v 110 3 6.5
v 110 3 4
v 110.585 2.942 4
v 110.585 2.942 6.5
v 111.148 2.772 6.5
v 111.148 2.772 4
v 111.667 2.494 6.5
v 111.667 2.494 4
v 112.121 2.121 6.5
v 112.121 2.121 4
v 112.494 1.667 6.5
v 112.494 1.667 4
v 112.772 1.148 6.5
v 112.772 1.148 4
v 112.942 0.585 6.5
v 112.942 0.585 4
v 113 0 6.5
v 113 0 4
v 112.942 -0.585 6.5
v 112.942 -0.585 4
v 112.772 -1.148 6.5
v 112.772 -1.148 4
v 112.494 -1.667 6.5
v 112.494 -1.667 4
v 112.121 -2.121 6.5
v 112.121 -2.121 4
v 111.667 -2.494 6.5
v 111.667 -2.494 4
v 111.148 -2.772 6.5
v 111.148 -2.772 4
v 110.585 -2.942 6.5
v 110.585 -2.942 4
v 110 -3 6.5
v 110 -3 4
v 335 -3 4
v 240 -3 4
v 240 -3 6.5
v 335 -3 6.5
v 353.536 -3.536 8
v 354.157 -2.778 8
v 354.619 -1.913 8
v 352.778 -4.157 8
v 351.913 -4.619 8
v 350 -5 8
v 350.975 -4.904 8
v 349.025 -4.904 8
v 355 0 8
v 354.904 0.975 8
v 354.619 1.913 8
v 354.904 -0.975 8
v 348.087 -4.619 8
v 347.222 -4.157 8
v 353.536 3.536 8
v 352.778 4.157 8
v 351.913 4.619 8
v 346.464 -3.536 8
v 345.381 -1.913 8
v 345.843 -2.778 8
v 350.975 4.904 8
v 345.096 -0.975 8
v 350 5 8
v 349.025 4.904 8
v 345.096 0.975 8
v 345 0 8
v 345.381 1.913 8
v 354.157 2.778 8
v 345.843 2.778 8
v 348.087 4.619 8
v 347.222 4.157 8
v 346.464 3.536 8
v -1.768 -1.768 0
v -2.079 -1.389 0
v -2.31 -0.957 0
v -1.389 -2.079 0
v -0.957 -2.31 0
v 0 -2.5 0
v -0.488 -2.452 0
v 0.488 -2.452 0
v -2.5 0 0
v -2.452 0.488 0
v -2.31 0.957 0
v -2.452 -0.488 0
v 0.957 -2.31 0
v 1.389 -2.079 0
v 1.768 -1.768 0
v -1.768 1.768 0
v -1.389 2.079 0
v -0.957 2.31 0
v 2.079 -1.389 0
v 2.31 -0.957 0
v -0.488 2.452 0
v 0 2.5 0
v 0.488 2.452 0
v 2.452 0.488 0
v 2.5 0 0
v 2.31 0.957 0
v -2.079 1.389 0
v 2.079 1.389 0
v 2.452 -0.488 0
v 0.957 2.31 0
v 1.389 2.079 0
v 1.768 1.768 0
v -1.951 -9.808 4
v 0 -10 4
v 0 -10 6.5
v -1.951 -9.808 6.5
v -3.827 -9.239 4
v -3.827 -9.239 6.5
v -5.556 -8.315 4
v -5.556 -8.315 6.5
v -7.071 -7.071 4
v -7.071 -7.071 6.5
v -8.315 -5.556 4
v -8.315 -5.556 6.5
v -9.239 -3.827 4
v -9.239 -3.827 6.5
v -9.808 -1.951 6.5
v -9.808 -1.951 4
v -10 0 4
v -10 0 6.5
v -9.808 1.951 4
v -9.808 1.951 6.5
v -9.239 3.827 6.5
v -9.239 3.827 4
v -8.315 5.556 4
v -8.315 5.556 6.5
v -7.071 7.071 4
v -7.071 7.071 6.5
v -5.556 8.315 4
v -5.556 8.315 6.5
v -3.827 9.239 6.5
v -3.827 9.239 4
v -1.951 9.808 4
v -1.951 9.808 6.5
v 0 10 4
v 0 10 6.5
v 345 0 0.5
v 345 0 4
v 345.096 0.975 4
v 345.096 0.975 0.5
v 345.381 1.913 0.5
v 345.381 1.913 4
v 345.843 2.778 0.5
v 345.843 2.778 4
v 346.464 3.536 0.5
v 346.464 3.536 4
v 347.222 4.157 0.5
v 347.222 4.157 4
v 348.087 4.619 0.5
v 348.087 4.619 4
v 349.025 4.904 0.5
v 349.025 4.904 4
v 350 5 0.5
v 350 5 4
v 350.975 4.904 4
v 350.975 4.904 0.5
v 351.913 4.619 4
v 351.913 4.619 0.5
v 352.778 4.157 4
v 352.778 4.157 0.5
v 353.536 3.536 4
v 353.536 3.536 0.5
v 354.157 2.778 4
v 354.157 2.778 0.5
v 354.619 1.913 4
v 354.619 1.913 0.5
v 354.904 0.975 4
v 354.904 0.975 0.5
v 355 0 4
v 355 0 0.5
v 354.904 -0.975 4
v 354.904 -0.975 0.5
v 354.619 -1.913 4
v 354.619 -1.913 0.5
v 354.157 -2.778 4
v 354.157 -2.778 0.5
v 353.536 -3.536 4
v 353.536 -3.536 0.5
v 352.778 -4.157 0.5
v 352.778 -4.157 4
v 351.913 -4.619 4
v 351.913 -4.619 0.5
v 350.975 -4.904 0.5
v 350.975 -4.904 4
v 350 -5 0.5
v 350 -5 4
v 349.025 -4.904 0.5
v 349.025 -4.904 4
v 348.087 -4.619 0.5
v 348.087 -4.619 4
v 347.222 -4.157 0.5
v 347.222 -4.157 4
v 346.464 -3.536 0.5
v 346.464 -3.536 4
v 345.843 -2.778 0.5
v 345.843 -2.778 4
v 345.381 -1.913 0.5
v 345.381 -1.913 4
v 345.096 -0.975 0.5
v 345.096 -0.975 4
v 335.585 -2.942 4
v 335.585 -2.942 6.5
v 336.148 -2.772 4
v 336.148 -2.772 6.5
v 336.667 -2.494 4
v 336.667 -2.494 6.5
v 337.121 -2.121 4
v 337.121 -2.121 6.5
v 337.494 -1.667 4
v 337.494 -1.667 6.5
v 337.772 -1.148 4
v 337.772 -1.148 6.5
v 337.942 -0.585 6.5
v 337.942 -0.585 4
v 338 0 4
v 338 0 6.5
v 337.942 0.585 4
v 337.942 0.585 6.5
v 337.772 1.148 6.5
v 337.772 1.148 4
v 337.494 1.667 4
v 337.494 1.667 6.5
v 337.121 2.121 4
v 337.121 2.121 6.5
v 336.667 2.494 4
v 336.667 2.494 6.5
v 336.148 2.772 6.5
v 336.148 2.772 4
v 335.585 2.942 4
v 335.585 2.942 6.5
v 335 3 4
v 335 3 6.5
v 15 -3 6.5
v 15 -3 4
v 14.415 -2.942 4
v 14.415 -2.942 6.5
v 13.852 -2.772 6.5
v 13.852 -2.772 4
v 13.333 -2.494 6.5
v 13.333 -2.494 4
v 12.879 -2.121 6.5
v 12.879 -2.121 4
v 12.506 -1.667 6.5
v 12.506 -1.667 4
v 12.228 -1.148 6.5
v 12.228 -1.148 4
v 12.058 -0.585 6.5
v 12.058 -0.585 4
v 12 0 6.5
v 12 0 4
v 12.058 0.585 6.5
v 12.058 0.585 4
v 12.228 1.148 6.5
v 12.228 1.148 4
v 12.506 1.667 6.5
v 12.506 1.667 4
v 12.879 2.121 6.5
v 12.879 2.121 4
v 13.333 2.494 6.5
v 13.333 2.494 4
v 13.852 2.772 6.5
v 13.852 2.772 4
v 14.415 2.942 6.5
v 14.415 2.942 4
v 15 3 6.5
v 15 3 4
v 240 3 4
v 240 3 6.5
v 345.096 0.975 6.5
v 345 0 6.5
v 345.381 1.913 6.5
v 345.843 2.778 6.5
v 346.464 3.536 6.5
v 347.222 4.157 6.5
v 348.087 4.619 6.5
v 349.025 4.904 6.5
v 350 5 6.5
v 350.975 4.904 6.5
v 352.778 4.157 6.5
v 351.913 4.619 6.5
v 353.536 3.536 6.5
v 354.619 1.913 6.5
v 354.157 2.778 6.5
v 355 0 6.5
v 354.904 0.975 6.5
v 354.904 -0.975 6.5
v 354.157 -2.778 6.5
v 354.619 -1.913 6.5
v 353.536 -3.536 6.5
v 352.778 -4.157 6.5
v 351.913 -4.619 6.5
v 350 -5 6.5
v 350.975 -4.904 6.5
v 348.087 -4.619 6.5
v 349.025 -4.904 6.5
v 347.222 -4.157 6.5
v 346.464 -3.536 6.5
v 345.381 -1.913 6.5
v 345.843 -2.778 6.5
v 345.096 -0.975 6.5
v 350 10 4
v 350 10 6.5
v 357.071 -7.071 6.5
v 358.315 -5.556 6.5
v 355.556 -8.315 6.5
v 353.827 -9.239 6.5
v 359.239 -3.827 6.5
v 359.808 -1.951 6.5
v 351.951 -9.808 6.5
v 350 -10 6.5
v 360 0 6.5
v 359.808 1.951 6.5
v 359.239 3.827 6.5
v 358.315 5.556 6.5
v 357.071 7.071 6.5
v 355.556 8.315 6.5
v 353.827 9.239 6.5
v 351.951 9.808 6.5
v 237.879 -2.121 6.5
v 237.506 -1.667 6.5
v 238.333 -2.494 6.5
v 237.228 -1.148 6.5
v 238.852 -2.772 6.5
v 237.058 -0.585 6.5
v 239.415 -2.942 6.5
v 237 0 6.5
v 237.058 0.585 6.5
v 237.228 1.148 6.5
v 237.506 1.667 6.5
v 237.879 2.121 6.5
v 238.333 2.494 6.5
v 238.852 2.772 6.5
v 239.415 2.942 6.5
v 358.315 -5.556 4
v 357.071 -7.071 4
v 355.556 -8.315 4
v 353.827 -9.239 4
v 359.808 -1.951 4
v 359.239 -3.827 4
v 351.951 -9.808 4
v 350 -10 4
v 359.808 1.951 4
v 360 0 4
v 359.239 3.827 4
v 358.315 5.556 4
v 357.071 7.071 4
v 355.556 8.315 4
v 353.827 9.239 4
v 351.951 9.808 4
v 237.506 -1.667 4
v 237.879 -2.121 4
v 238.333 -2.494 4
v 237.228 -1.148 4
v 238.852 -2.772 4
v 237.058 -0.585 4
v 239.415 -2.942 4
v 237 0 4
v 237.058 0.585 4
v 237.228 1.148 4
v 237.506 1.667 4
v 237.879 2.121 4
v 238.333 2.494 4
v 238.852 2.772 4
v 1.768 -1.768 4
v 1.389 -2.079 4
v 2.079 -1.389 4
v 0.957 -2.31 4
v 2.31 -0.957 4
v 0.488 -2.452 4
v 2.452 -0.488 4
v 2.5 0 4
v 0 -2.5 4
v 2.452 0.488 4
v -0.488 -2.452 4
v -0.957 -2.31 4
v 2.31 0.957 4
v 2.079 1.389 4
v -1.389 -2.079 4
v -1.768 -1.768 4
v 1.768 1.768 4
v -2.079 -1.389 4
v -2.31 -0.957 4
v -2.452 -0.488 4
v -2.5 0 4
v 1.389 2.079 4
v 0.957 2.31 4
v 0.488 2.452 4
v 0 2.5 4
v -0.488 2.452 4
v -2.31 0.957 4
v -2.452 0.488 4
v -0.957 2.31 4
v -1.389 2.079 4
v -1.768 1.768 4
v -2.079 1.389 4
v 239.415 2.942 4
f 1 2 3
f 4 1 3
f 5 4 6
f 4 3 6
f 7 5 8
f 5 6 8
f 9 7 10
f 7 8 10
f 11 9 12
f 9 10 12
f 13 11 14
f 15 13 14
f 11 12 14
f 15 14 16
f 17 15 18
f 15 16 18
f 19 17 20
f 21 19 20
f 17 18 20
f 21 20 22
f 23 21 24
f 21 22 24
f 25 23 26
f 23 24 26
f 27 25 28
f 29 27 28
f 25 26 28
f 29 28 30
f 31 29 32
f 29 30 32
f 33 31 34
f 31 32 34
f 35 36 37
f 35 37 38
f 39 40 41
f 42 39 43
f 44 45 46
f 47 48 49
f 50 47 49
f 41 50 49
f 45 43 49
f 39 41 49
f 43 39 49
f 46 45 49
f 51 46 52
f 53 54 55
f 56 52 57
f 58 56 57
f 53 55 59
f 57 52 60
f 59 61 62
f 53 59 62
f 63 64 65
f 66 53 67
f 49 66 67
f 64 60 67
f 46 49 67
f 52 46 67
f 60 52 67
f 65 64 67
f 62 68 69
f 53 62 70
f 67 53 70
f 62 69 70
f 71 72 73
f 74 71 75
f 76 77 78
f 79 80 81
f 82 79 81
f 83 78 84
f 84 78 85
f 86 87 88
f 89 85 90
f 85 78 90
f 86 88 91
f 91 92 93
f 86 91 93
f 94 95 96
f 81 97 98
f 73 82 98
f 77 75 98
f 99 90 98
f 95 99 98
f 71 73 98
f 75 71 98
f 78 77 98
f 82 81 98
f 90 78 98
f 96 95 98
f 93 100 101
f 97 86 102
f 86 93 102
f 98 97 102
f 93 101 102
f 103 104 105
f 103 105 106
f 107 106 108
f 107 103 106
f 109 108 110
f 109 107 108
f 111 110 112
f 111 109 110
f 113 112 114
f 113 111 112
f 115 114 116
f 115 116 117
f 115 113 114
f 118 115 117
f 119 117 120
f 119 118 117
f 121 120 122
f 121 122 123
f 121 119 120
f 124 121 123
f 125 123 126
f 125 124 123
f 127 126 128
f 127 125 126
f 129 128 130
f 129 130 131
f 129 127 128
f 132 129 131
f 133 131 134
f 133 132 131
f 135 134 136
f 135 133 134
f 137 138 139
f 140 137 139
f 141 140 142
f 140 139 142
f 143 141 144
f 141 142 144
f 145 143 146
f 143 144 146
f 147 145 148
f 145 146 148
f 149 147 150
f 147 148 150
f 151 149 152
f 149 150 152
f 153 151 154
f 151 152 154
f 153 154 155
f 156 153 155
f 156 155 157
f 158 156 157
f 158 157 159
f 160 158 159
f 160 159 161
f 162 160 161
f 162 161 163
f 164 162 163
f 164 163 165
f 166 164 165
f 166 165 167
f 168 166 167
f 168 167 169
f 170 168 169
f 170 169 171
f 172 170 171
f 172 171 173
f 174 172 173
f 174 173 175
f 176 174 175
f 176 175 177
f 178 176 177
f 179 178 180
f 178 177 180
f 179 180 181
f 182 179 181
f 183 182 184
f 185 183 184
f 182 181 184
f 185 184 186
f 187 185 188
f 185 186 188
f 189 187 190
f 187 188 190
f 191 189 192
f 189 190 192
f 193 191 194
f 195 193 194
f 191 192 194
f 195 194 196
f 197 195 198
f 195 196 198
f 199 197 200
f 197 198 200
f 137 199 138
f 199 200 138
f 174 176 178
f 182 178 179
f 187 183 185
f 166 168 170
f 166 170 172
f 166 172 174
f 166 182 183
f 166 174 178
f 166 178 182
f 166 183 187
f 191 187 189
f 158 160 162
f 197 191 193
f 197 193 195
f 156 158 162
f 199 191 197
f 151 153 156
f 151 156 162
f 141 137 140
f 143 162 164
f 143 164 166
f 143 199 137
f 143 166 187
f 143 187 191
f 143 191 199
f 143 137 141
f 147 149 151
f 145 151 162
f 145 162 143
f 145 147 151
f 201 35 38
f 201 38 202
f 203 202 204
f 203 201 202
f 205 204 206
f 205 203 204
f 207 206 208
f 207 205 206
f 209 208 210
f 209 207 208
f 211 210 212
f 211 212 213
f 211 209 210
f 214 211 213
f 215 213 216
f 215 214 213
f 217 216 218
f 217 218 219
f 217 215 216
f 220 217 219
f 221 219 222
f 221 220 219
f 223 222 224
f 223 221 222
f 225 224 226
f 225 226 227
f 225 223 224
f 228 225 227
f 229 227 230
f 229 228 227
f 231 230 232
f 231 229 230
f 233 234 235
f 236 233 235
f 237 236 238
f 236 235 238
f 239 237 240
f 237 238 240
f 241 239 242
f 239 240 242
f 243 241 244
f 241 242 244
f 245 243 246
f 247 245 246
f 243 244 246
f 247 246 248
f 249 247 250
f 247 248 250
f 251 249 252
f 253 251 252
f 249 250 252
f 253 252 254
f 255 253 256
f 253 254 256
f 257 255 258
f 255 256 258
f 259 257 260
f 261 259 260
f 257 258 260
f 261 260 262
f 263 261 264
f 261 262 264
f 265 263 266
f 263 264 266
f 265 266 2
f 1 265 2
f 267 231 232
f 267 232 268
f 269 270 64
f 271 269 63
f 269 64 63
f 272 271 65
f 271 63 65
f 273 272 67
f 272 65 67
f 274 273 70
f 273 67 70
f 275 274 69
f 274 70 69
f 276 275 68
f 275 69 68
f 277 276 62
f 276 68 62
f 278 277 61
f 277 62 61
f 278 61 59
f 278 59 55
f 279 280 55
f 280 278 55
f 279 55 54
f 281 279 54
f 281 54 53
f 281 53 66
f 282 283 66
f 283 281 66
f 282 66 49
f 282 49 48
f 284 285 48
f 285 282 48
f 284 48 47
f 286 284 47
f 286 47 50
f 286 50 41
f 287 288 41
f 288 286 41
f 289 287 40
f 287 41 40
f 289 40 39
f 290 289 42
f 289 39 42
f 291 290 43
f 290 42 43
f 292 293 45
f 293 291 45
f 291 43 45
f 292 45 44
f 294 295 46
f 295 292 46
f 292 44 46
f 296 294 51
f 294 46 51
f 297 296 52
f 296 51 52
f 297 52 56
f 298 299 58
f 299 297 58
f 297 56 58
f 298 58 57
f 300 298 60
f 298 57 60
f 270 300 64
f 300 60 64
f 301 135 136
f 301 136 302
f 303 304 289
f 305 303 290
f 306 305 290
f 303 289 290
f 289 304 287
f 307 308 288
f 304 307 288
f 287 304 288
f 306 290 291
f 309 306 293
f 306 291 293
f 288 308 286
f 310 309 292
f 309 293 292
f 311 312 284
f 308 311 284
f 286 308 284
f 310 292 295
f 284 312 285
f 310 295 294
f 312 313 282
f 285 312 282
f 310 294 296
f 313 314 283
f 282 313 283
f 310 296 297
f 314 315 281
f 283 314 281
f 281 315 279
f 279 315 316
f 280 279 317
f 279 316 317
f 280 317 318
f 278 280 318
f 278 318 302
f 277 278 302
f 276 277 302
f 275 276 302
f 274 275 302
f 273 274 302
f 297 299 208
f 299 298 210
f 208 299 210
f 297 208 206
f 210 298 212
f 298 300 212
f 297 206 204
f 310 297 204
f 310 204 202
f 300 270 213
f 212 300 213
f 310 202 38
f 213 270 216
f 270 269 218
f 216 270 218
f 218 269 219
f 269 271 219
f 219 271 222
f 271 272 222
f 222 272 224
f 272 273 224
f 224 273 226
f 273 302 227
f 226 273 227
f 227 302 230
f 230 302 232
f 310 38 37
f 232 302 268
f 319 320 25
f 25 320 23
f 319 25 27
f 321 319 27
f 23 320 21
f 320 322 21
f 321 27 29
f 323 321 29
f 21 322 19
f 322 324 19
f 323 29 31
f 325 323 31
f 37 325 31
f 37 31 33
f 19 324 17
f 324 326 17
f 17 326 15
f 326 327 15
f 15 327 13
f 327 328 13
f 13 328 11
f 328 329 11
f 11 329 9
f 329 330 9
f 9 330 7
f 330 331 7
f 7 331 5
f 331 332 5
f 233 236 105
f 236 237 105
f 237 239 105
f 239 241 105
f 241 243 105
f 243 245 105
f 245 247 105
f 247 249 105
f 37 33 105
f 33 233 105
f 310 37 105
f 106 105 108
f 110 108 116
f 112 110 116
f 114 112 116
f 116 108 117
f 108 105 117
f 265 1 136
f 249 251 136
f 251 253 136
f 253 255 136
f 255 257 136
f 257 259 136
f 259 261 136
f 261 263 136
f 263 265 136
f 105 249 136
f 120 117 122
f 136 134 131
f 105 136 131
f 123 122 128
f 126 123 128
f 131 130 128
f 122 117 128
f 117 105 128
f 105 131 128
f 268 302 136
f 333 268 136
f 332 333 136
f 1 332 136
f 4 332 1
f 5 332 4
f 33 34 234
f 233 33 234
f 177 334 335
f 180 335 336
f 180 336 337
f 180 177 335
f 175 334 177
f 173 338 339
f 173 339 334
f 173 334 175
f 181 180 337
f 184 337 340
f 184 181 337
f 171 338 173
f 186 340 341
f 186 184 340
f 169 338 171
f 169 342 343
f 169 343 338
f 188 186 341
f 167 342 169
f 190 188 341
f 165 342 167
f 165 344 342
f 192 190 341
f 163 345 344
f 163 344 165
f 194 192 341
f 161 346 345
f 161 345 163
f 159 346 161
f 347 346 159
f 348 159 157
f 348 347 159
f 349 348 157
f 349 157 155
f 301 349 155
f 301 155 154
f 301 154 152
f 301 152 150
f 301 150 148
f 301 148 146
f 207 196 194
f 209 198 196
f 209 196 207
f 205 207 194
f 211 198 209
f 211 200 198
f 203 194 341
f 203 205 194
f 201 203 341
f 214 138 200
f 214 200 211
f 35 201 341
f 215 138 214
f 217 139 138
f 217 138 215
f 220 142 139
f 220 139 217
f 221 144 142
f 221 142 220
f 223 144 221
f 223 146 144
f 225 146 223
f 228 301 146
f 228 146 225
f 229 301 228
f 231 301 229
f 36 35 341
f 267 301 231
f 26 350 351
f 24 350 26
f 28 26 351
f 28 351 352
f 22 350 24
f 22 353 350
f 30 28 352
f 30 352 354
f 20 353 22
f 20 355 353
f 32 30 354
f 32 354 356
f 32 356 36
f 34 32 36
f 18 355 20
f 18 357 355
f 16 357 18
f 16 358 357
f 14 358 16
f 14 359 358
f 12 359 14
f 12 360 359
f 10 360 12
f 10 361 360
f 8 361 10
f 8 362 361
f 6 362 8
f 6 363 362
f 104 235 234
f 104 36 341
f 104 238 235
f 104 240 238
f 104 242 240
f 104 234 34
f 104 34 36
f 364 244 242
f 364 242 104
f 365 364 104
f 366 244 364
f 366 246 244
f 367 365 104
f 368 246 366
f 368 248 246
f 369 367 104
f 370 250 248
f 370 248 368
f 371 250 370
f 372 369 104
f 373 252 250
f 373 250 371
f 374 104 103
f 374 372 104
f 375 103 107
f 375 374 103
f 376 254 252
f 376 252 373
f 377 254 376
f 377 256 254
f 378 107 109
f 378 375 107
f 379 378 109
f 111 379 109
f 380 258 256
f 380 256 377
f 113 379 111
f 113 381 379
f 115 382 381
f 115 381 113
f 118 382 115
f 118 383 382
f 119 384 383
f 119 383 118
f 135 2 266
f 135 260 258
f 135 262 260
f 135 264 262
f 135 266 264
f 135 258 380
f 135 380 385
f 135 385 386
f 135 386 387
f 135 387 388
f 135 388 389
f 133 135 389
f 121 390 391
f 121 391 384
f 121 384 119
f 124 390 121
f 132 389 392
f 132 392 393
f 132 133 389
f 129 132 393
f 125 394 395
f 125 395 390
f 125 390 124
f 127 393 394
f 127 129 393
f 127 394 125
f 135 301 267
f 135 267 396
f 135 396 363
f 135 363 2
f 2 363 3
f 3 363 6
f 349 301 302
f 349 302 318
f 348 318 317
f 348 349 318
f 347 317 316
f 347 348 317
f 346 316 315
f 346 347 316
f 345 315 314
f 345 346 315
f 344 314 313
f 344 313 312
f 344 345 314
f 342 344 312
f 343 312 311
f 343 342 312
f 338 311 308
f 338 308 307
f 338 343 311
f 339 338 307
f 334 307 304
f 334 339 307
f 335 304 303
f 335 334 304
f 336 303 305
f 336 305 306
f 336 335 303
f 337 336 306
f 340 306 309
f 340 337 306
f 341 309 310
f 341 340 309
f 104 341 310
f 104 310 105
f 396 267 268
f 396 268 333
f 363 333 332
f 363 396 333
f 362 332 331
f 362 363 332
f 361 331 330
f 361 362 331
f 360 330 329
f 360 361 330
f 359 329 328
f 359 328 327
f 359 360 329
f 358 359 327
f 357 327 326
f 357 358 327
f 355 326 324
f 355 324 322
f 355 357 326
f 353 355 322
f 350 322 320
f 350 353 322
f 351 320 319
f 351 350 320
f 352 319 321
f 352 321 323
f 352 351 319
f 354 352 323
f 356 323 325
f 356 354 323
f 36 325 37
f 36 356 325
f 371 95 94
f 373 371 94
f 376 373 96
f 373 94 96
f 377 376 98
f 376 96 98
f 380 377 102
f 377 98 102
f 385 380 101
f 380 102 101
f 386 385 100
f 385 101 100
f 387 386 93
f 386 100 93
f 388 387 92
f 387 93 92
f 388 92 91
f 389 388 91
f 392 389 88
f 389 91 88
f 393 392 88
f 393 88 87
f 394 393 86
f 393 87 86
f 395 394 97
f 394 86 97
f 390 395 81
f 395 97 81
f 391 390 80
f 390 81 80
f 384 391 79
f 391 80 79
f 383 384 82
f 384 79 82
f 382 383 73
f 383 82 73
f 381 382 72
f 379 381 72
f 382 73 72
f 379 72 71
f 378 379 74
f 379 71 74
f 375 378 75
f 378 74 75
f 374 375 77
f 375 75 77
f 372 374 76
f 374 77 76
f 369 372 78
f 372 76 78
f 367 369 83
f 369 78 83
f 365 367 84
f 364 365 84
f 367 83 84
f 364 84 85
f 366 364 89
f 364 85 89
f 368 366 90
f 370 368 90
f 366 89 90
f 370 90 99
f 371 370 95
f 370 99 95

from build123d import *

# Parameters (mm, degrees)
SKETCH1_R                = 2.5
BOSS_EXTRUDE1_DEPTH      = 4
SKETCH3_R                = 5
BOSS_EXTRUDE2_DEPTH      = 2.5
BOSS_EXTRUDE3_DEPTH      = 3.5
BOSS_EXTRUDE3_DEPTH_BACK = 4
SKETCH4_R                = 5


with BuildPart() as part:
    # Sketch1 → Boss-Extrude1 (new body)
    with BuildSketch(Plane.XY):
        Circle(SKETCH1_R)
    extrude(amount=BOSS_EXTRUDE1_DEPTH)

    # Sketch3 → Boss-Extrude2 (add)
    with BuildSketch(Plane.XY.offset(4)):
        with BuildLine():
            Line((0, 10), (350, 10))
            ThreePointArc((350, 10), (360, 0), (350, -10))
            Line((350, -10), (0, -10))
            ThreePointArc((0, -10), (-10, 0), (0, 10))
        make_face()
        with Locations((350, 0)):
            Circle(SKETCH3_R, mode=Mode.SUBTRACT)
        with BuildLine():
            Line((15, 3), (110, 3))
            ThreePointArc((110, 3), (113, 0), (110, -3))
            Line((110, -3), (15, -3))
            ThreePointArc((15, -3), (12, 0), (15, 3))
        make_face(mode=Mode.SUBTRACT)
        with BuildLine():
            Line((335, 3), (240, 3))
            ThreePointArc((240, 3), (237, 0), (240, -3))
            Line((240, -3), (335, -3))
            ThreePointArc((335, -3), (338, 0), (335, 3))
        make_face(mode=Mode.SUBTRACT)
    extrude(amount=BOSS_EXTRUDE2_DEPTH)

    # Sketch4 → Boss-Extrude3 (add, two sides: drawn at the far end of the back side and taken through both)
    with BuildSketch(Plane(origin=(0, 0, 4), x_dir=(-1, 0, 0), z_dir=(0, 0, -1)).offset(-BOSS_EXTRUDE3_DEPTH_BACK)):
        with Locations((-350, 0)):
            Circle(SKETCH4_R)
    extrude(amount=BOSS_EXTRUDE3_DEPTH + BOSS_EXTRUDE3_DEPTH_BACK)


solid = part.part
